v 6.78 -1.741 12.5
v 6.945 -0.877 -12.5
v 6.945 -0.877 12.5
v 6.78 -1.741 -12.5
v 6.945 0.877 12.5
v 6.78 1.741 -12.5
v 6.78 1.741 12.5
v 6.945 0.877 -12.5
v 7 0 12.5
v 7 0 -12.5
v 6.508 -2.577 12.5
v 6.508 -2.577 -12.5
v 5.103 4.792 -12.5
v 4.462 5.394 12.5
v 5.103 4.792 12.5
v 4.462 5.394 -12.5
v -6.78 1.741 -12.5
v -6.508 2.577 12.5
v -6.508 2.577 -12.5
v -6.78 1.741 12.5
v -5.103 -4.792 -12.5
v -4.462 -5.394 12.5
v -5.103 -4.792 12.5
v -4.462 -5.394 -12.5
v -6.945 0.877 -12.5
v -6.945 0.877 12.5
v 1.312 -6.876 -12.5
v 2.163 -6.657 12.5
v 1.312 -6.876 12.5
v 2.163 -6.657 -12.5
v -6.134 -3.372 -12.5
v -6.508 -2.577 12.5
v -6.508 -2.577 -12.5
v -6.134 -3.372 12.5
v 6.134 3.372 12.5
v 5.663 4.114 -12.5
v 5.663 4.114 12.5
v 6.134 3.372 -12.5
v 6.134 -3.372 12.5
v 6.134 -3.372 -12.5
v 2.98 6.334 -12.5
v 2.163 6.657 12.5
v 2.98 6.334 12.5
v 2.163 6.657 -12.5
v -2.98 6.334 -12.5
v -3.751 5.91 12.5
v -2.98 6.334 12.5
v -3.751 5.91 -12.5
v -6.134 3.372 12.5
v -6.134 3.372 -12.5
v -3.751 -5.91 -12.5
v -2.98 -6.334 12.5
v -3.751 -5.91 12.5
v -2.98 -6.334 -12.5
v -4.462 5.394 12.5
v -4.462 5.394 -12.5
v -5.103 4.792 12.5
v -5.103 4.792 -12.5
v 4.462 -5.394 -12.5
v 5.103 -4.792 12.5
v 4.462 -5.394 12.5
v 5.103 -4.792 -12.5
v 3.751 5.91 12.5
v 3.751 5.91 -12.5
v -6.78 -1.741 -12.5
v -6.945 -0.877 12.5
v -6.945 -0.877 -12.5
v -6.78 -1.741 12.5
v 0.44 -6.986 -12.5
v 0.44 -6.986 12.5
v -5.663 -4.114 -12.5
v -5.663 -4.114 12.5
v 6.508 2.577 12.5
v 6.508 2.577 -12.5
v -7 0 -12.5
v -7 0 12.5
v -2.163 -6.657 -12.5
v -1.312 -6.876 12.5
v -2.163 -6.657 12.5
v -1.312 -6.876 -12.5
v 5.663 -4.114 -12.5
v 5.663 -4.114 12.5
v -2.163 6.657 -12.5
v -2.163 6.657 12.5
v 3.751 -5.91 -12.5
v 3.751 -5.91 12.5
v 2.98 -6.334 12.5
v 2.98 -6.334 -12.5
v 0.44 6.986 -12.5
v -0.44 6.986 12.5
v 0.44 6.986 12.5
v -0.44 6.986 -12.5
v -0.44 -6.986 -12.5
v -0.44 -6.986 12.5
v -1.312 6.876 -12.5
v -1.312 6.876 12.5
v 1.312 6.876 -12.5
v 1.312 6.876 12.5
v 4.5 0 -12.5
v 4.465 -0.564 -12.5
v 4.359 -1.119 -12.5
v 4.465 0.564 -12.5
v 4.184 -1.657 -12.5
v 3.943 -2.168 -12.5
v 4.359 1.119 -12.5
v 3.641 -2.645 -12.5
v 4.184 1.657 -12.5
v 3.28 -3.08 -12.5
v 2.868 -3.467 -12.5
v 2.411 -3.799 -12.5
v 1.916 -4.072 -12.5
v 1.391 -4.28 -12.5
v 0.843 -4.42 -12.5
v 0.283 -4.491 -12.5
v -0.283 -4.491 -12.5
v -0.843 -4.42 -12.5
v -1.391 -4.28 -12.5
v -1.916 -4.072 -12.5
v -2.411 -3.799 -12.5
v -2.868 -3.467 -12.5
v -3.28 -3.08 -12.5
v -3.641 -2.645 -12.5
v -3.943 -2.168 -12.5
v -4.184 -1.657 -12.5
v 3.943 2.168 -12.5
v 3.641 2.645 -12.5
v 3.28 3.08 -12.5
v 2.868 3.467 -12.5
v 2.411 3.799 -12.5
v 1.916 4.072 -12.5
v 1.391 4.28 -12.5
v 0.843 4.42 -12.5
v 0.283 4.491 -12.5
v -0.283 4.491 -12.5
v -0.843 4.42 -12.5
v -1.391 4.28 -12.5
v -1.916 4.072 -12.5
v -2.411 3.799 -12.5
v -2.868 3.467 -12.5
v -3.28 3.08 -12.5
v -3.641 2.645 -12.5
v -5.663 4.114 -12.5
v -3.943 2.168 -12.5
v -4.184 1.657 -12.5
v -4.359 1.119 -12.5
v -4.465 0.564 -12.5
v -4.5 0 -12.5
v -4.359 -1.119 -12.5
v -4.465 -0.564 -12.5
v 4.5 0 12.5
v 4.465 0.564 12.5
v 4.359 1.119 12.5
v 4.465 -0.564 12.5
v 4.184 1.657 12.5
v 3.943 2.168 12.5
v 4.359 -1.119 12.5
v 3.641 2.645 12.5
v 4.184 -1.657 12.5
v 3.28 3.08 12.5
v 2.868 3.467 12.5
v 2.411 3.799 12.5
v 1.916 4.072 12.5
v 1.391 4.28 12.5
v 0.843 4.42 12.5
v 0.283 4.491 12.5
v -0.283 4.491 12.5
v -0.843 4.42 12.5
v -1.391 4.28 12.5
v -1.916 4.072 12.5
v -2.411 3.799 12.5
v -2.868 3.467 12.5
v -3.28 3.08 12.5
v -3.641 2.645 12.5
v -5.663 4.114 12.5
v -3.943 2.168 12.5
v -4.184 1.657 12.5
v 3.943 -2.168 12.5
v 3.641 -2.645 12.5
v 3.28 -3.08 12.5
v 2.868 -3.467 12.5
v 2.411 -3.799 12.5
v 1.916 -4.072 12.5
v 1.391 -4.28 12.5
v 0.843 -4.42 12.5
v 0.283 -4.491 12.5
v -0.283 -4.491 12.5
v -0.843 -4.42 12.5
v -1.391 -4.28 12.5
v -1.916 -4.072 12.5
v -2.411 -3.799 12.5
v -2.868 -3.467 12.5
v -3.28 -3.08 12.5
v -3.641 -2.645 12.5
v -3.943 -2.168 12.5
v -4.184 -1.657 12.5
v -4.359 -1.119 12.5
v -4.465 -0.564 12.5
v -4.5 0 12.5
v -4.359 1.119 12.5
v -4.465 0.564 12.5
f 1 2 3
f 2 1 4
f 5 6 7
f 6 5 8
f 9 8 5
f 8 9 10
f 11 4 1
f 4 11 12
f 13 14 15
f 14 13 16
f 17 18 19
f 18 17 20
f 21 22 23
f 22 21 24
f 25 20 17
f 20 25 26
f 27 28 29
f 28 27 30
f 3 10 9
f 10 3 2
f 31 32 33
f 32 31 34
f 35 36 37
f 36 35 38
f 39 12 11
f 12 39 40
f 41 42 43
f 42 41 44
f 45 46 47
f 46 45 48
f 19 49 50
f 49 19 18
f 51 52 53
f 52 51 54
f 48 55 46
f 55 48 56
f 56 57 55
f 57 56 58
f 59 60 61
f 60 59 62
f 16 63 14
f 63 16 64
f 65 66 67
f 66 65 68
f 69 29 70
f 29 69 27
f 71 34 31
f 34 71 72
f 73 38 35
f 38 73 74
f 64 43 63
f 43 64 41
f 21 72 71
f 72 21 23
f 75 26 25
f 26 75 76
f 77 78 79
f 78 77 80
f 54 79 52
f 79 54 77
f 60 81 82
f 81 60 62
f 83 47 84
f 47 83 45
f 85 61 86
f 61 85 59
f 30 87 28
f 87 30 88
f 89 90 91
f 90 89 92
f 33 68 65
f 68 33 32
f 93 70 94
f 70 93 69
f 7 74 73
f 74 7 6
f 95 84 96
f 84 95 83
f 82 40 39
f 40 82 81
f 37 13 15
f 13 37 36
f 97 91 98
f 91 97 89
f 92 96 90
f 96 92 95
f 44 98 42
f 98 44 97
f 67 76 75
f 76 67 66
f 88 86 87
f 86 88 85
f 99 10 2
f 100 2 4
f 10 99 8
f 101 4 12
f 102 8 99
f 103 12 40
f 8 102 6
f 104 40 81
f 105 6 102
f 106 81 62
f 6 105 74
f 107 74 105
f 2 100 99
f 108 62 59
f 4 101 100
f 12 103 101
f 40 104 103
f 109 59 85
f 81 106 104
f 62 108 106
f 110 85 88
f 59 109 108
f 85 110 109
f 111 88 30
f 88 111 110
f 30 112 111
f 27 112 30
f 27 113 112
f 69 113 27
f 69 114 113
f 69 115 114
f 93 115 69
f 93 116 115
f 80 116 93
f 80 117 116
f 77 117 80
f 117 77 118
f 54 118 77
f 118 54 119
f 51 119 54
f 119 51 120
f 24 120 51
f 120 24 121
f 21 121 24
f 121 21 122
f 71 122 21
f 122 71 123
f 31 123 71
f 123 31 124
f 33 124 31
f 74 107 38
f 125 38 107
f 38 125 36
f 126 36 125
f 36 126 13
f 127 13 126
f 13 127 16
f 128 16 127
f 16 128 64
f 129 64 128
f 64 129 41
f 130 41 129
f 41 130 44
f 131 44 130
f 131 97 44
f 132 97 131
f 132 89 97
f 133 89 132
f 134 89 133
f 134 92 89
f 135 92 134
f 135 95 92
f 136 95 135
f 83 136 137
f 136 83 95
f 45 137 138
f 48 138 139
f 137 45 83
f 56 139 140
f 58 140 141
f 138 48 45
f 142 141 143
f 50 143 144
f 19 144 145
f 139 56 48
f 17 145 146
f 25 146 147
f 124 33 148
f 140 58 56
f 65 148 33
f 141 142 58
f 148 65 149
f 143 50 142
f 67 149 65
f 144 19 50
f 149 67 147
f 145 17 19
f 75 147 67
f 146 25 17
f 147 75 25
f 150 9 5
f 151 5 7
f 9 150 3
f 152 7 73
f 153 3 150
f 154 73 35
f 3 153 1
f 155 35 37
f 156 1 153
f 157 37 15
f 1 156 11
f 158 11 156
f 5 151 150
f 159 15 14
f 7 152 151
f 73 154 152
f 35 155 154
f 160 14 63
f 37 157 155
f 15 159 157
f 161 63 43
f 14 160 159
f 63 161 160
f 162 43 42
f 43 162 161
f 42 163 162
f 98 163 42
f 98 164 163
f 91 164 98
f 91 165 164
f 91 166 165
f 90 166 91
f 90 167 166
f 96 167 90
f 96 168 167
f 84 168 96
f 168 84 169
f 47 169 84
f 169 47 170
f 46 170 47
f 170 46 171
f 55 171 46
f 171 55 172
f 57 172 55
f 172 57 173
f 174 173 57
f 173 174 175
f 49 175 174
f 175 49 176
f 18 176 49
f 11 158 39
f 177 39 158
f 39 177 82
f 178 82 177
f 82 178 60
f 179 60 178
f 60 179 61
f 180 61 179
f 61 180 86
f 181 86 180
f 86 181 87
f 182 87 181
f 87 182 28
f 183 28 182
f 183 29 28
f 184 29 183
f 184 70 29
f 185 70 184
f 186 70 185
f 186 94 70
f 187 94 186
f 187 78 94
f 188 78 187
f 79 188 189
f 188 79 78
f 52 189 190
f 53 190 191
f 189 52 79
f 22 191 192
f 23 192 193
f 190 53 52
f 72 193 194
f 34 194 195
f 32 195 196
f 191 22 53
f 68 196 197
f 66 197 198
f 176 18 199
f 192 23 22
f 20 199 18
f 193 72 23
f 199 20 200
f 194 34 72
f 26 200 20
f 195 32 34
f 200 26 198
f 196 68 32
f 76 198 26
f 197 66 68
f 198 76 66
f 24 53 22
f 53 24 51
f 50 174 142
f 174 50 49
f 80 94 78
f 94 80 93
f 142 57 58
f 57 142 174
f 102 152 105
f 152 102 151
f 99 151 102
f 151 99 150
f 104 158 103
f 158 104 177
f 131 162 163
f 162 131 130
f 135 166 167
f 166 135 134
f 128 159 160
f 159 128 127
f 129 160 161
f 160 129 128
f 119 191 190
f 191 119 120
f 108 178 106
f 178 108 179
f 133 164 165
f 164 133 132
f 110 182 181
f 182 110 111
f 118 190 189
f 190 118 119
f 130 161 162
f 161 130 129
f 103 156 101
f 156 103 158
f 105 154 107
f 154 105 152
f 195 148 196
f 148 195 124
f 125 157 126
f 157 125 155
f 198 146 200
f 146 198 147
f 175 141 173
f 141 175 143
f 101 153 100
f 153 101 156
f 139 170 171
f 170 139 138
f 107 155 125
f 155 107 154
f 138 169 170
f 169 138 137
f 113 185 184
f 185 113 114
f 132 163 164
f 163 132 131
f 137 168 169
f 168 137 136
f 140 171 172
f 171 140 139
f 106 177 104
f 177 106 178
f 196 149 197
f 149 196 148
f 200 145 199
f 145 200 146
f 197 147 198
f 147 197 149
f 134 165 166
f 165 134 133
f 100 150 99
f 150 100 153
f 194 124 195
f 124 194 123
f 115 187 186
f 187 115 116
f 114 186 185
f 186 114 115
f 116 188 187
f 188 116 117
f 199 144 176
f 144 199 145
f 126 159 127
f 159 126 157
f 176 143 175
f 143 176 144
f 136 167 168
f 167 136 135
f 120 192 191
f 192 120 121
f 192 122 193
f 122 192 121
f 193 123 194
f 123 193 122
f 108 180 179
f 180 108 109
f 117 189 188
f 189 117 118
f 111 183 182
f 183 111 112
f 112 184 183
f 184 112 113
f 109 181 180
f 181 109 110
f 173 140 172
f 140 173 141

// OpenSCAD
$fn = 50;


difference() {
	union() {
		translate(v = [0, 0, -12.5000000000]) {
			cylinder(h = 25, r = 7.0000000000);
		}
	}
	union() {
		translate(v = [0, 0, -100.0000000000]) {
			cylinder(h = 200, r = 4.5000000000);
		}
	}
}
